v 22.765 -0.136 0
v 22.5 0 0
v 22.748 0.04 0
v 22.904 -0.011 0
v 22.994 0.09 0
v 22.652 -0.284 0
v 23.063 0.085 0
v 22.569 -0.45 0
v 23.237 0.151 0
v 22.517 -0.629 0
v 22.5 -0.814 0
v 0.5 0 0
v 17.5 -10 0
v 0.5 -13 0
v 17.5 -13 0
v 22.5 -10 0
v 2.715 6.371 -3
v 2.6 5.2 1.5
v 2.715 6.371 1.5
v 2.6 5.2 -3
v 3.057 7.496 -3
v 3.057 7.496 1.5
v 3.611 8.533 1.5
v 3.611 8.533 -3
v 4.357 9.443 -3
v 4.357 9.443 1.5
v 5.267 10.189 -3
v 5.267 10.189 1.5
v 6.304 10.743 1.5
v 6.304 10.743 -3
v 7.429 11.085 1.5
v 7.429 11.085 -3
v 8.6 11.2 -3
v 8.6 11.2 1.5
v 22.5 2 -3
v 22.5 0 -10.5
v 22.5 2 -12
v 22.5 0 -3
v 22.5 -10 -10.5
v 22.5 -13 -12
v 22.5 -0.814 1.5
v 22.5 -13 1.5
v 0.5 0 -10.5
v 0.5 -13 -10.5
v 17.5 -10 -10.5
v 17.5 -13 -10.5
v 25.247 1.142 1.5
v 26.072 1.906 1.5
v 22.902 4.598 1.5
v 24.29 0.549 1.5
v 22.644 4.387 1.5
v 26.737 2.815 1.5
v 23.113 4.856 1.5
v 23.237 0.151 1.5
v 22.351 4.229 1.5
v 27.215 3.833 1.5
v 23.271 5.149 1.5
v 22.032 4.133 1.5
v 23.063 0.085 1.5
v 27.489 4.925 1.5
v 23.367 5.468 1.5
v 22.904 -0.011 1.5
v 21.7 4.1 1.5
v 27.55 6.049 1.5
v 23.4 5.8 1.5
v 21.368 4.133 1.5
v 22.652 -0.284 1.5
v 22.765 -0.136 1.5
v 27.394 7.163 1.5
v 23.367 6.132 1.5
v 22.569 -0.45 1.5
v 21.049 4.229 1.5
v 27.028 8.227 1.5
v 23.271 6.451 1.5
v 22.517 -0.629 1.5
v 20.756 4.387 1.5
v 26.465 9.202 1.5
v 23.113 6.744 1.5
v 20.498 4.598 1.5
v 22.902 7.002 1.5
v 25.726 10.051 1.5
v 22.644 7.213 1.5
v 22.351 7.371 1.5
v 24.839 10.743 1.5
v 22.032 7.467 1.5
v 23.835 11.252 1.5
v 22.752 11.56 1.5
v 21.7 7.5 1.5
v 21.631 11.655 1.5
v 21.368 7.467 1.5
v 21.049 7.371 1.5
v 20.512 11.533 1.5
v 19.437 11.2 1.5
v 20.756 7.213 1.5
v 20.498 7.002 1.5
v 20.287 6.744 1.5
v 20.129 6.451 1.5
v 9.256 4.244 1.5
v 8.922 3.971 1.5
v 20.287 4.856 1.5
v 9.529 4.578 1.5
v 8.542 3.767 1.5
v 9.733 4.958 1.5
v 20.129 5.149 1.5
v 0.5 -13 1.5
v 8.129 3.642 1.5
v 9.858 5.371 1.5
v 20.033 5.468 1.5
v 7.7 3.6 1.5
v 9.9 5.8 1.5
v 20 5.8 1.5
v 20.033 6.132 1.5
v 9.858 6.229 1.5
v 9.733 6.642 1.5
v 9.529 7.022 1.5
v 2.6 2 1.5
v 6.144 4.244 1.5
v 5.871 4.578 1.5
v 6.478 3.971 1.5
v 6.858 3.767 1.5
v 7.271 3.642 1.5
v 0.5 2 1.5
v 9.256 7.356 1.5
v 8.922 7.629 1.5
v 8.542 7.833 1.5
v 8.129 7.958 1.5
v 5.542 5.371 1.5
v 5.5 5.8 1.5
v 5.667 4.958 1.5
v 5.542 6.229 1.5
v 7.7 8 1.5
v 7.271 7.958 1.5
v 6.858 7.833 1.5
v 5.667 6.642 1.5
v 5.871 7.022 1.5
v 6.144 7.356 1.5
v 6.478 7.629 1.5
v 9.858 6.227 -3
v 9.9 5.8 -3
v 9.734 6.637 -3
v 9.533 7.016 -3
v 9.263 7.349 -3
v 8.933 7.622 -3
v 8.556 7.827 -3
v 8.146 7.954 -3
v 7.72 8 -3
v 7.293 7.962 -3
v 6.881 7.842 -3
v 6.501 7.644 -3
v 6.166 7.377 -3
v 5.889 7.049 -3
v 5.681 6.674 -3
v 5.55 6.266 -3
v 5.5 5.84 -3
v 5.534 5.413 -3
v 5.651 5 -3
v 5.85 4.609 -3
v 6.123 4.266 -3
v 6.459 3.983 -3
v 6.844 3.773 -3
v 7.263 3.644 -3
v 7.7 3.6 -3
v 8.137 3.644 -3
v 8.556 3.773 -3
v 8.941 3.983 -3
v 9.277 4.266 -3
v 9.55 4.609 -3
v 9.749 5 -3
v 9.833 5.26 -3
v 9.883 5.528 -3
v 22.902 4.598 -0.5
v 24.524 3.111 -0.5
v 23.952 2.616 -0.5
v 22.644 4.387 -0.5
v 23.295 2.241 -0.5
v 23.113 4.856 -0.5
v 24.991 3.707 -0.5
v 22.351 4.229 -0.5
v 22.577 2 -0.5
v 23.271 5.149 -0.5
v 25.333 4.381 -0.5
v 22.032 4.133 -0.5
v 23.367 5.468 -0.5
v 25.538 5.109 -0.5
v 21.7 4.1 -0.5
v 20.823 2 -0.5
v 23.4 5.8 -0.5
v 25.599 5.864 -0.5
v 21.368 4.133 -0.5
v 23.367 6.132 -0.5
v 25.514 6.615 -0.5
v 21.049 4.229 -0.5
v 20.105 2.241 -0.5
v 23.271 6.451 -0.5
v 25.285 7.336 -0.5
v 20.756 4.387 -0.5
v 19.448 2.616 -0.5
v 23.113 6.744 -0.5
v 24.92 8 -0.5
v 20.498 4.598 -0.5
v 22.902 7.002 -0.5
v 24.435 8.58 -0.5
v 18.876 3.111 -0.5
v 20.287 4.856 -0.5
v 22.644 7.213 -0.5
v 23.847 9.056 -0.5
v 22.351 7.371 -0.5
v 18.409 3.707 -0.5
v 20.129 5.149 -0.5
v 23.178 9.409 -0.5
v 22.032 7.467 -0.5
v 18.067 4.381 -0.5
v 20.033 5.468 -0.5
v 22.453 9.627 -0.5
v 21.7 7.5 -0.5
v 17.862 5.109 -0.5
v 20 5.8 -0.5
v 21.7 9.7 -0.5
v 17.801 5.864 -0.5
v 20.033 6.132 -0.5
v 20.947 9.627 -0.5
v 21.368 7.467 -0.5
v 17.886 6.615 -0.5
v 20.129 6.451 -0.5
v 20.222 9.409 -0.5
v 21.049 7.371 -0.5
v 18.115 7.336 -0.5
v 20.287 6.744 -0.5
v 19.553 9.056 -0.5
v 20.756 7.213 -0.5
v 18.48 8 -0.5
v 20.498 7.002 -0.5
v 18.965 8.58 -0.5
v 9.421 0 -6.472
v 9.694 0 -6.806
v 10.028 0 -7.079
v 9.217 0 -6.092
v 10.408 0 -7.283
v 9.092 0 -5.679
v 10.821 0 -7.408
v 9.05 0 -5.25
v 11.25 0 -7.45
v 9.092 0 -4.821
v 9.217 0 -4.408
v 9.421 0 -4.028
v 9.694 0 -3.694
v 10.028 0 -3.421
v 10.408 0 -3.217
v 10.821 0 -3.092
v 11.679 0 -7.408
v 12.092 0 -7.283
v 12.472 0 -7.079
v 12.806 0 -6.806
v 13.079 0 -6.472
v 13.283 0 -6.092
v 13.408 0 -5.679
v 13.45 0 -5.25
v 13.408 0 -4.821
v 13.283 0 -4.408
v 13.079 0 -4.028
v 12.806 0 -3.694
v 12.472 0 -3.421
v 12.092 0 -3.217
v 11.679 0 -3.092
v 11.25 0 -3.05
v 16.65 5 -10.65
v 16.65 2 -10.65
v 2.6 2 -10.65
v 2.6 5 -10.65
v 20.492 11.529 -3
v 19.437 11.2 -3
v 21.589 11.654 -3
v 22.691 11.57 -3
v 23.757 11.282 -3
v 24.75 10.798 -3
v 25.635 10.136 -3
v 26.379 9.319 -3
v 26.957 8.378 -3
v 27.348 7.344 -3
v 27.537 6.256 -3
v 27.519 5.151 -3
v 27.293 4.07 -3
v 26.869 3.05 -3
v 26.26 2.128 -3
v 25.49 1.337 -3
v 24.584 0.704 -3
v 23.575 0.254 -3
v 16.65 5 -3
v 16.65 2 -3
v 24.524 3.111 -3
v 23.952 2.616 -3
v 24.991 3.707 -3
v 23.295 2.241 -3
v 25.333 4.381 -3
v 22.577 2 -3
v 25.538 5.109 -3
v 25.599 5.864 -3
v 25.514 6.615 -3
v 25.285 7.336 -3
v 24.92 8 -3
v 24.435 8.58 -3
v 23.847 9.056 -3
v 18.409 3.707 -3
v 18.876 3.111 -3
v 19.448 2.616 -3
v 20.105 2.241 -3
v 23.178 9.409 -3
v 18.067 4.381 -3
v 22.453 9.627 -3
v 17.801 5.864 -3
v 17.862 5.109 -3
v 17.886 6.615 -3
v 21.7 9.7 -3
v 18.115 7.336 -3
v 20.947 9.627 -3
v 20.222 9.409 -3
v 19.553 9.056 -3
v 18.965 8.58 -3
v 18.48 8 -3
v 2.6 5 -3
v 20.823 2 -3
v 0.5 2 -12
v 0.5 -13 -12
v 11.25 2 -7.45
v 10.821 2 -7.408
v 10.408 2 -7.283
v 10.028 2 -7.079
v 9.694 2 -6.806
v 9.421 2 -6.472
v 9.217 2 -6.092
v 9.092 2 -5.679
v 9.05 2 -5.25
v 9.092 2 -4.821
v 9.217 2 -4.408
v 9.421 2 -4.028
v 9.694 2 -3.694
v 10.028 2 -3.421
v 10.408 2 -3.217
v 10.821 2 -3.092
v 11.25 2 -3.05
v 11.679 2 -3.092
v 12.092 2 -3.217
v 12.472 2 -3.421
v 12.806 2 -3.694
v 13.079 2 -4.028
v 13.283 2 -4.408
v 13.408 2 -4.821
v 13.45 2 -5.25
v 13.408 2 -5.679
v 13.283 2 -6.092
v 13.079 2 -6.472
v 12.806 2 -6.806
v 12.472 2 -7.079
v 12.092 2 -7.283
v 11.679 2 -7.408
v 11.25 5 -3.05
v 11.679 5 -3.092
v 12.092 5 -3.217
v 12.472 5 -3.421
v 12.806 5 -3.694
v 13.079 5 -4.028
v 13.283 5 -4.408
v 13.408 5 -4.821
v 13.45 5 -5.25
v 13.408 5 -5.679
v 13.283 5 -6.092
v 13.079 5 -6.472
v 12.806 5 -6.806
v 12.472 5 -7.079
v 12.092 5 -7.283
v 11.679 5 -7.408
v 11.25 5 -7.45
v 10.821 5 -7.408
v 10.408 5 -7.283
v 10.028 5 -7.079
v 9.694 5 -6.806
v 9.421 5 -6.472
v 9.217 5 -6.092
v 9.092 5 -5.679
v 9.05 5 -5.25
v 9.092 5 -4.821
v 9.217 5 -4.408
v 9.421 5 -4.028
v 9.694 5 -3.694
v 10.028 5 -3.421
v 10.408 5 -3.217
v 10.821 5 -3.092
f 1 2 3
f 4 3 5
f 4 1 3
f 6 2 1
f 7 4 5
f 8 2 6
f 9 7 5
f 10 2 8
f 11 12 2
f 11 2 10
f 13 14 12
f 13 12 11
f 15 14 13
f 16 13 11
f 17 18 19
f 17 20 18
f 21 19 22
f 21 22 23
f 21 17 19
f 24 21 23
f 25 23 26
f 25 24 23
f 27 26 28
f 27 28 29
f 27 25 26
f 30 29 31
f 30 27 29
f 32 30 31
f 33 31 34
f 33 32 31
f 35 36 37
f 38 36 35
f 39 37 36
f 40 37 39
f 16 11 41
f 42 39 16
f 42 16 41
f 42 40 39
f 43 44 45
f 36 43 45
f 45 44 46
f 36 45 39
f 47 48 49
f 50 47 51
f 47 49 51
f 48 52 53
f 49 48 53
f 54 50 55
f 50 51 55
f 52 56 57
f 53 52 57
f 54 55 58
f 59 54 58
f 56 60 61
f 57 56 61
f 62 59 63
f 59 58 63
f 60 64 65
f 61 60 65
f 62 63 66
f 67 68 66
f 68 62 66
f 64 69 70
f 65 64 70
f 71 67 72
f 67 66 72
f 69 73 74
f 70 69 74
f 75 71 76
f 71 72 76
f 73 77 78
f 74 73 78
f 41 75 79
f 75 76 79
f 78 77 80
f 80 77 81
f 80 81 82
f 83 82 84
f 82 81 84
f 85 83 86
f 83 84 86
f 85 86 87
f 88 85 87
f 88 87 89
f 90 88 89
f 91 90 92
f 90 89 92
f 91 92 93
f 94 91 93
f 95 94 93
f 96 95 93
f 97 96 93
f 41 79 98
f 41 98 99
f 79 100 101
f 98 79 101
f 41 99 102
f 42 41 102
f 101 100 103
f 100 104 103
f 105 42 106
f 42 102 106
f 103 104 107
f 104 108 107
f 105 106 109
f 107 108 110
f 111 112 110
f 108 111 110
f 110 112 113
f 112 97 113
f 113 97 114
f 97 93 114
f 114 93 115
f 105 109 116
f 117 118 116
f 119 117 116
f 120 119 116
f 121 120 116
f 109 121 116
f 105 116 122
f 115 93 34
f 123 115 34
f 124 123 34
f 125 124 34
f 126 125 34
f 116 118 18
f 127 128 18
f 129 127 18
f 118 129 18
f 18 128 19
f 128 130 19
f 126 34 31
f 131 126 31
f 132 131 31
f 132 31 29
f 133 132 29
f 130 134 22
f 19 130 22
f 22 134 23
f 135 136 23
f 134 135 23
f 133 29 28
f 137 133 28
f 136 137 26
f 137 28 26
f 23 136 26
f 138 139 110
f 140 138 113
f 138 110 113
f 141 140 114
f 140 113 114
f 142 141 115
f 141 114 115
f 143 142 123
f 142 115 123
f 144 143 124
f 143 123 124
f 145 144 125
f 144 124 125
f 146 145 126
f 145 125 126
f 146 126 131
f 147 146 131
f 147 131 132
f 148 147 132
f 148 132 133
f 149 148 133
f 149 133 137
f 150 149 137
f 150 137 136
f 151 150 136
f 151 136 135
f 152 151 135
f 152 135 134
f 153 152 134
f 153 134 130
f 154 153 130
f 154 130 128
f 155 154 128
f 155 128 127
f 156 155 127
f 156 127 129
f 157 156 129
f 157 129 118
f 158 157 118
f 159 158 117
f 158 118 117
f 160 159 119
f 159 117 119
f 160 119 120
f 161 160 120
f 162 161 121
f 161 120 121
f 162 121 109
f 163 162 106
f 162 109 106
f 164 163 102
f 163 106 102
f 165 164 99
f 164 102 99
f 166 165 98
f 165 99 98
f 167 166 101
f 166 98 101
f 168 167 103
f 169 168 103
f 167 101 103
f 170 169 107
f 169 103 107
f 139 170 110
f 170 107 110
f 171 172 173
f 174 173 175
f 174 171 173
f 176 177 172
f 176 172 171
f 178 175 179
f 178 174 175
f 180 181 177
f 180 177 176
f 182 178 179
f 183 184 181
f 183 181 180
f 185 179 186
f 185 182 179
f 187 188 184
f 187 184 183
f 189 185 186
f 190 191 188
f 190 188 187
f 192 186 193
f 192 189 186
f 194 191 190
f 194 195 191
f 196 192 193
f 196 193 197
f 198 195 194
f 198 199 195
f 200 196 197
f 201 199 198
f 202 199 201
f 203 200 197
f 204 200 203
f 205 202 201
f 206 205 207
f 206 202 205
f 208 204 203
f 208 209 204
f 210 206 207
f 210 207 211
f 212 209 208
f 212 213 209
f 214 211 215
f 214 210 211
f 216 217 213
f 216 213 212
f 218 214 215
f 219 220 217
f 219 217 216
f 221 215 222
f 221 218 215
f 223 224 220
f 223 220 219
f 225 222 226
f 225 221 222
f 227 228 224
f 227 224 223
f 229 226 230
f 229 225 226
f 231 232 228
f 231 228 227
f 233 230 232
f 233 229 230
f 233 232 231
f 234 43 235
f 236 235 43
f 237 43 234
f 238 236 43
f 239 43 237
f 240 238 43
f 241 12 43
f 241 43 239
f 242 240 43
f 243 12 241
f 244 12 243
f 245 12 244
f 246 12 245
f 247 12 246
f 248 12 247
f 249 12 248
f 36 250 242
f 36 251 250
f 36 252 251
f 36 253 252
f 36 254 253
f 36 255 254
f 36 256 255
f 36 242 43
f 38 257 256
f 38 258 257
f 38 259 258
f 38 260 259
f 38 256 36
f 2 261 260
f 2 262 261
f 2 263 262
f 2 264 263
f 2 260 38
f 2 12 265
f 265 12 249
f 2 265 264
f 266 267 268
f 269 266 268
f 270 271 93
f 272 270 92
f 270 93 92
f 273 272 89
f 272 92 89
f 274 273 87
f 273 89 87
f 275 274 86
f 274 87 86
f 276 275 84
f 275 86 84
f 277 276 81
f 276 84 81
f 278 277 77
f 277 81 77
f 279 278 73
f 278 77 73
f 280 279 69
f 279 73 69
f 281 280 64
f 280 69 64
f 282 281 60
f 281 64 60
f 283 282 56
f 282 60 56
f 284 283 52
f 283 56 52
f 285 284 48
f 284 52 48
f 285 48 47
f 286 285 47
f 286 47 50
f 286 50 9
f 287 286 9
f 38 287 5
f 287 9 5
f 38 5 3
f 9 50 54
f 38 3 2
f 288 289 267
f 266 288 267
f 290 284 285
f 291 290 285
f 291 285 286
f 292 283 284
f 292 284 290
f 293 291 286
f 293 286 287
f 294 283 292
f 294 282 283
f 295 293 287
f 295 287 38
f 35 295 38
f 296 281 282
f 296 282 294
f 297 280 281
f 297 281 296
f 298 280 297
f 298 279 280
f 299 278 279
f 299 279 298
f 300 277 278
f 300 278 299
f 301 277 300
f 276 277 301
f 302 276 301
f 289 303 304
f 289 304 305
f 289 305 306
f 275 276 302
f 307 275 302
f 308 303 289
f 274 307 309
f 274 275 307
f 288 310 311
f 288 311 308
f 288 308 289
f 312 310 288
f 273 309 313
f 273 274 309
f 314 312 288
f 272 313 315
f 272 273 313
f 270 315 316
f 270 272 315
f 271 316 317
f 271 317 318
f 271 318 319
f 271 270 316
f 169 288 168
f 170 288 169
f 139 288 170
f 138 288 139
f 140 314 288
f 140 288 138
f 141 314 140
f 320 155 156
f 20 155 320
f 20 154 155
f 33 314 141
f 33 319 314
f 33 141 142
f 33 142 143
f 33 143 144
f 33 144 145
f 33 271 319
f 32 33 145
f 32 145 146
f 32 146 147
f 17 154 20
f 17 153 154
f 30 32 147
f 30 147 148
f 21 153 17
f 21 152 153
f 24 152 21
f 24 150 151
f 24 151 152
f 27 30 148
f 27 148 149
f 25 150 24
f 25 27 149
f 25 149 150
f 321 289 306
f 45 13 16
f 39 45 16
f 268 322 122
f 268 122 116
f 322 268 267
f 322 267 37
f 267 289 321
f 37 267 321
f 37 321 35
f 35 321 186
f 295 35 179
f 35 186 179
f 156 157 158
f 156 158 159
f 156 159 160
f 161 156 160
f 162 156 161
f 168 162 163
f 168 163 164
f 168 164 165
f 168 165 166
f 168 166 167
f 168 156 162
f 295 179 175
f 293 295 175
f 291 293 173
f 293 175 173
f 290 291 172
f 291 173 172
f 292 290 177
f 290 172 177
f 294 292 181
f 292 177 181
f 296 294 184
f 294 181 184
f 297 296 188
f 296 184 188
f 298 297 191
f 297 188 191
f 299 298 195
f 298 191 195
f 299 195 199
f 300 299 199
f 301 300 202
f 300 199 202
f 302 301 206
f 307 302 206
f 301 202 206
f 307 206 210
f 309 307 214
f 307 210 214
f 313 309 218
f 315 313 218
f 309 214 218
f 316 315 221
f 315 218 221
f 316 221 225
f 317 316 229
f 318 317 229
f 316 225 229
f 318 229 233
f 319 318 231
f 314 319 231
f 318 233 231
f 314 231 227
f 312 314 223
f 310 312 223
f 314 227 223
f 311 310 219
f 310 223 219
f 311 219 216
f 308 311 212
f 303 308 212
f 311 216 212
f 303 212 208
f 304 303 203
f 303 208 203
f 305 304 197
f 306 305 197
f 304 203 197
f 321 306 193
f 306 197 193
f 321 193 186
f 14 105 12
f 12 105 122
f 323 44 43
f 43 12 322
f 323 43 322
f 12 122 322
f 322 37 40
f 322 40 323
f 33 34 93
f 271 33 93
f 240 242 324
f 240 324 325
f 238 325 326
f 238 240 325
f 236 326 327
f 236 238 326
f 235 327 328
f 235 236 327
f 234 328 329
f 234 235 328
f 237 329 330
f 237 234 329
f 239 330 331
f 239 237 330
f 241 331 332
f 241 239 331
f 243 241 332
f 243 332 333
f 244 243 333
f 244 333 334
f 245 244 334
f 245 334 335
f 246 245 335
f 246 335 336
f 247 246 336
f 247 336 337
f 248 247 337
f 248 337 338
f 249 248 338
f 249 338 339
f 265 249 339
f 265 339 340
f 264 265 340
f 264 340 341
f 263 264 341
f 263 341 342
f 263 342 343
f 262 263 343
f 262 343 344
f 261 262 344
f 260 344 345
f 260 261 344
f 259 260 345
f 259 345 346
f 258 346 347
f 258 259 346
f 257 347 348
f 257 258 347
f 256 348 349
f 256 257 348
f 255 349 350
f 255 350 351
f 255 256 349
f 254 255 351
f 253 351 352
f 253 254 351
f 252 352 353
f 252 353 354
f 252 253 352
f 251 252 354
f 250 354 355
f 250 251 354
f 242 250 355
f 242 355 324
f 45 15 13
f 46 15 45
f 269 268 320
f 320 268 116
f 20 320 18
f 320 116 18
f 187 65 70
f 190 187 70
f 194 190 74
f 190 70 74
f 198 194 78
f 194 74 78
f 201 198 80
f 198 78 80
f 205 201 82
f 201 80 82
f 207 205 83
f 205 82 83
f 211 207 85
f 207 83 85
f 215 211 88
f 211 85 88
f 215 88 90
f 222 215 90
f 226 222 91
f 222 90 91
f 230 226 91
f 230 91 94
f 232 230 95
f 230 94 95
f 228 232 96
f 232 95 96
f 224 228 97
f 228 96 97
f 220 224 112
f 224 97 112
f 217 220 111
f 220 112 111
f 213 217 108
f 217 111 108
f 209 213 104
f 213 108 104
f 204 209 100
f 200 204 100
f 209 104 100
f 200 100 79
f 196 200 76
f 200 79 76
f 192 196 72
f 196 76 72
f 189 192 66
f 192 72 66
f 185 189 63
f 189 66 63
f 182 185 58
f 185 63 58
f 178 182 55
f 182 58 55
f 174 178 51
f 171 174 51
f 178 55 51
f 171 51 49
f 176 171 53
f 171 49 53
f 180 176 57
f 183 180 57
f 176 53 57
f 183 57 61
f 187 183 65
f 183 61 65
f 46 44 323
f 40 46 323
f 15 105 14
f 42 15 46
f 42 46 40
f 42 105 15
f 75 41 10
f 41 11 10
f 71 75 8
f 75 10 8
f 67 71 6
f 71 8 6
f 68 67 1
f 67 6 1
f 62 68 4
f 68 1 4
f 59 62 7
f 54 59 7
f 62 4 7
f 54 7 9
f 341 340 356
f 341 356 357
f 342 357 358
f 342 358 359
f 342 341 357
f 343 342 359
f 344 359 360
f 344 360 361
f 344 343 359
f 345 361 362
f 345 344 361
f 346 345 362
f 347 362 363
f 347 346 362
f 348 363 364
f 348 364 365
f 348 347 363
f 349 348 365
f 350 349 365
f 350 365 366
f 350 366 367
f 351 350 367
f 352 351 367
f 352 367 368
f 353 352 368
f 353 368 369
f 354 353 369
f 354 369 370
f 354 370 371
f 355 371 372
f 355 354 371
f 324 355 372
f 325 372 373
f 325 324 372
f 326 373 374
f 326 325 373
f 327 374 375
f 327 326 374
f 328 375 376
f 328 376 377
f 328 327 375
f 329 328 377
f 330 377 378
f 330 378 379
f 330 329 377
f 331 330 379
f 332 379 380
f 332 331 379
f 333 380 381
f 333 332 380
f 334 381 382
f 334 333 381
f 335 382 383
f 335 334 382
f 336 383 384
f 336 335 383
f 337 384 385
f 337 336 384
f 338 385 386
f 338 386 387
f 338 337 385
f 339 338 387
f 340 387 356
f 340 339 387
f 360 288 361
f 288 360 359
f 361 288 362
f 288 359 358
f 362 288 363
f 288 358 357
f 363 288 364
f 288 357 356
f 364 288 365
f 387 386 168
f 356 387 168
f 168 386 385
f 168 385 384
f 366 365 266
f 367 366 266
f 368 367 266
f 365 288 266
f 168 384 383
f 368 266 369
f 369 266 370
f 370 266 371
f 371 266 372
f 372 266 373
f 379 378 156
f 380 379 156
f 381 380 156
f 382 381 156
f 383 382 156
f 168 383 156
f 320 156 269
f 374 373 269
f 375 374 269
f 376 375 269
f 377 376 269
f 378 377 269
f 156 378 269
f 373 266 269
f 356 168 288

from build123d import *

# Parameters (mm, degrees)
SKETCH1_W            = 21.5
SKETCH1_H            = 10.5
BOSS_EXTRUDE1_DEPTH  = 2
BOSS_EXTRUDE3_DEPTH  = 15
BOSS_EXTRUDE7_REACH  = 30.623
SKETCH8_W            = 1
SKETCH8_H            = 2
BOSS_EXTRUDE5_DEPTH  = 3
SKETCH6_R            = 1.7
BOSS_EXTRUDE6_DEPTH  = 2
BOSS_EXTRUDE8_DEPTH  = 2.5
FILLET1_R            = 1
SKETCH12_W           = 1
SKETCH12_H           = 10.5
CUT_EXTRUDE1_DEPTH   = 13
CUT_EXTRUDE2_DEPTH   = 1.5
SKETCH15_R           = 2.2
BOSS_EXTRUDE9_DEPTH  = 3
SKETCH16_R           = 0.670189152
BOSS_EXTRUDE10_DEPTH = 4.5
SKETCH17_R           = 2.2
CUT_EXTRUDE3_DEPTH   = 4.5
CUT_EXTRUDE4_START   = -4.5
SKETCH18_R           = 2.2
CUT_EXTRUDE4_DEPTH   = 4.5
FILLET2_R            = 6


with BuildPart() as part:
    # Sketch1 → Boss-Extrude1 (new body)
    with BuildSketch(Plane(origin=(0, 0, 0), x_dir=(1, 0, 0), z_dir=(0, 1, 0))):
        with Locations((10.75, 5.25)):
            Rectangle(SKETCH1_W, SKETCH1_H)
    extrude(amount=BOSS_EXTRUDE1_DEPTH)

    # Sketch3 → Boss-Extrude3 (add)
    with BuildSketch(Plane(origin=(0, 2, 0), x_dir=(1, 0, 0), z_dir=(0, 1, 0))):
        Polygon((0, 10.5), (22.5, 10.5), (22.5, 12), (-1, 12), (-1, -1.5), (22.5, -1.5), (22.5, 0), (0, 0), align=None)
    extrude(amount=-BOSS_EXTRUDE3_DEPTH)

    # Sketch8 → Boss-Extrude7 (add, up to next)
    with BuildSketch(Plane(origin=(0, 0, 0), x_dir=(-1, 0, 0), z_dir=(0, 0, -1)), mode=Mode.PRIVATE) as boss_extrude7_sk1:
        with Locations((-22, 1)):
            Rectangle(SKETCH8_W, SKETCH8_H)
    boss_extrude7_tool1 = extrude(boss_extrude7_sk1.sketch, amount=BOSS_EXTRUDE7_REACH, mode=Mode.PRIVATE) - part.part
    add(boss_extrude7_tool1.solids().sort_by_distance((22, 1, 0))[0])

    # Sketch5 → Boss-Extrude5 (add)
    with BuildSketch(Plane.XZ.offset(13)):
        Polygon((17.5, 0), (17.5, -10.5), (22.5, -10.5), (22.5, 1.5), (17.5, 1.5), align=None)
    extrude(amount=-BOSS_EXTRUDE5_DEPTH)



with BuildPart() as body_2:
    # Sketch6 → Boss-Extrude6 (new body)
    with BuildSketch(Plane.XY.offset(1.5)):
        with BuildLine():
            Line((22.5, 0), (22.5, 2))
            Line((22.5, 2), (17.24578851, 2))
            ThreePointArc((17.24578851, 2), (23.78286231, 11.271899542), (22.5, 0))
        make_face()
        with Locations((21.7, 5.8)):
            Circle(SKETCH6_R, mode=Mode.SUBTRACT)
    extrude(amount=-BOSS_EXTRUDE6_DEPTH)


with BuildPart() as part_1:
    add(part.part)

    add(body_2.part)  # Boss-Extrude8 merges body 2
    # Sketch9 → Boss-Extrude8 (add)
    with BuildSketch(Plane(origin=(0, 0, -0.5), x_dir=(-1, 0, 0), z_dir=(0, 0, -1))):
        with BuildLine():
            Line((-22.5, 2), (-22.577496439, 2))
            ThreePointArc((-22.577496439, 2), (-21.7, 9.7), (-20.822503561, 2))
            Line((-20.822503561, 2), (-17.24578851, 2))
            ThreePointArc((-17.24578851, 2), (-23.78286231, 11.271899542), (-22.5, 0))
            Line((-22.5, 0), (-22.5, 2))
        make_face()
    extrude(amount=BOSS_EXTRUDE8_DEPTH)

    # Fillet1
    fillet1_edges = [part_1.edges().sort_by_distance(p)[0] for p in [
        (22.5, 0, 0.75),
        (17.24578851, 2, -0.75),
    ]]
    fillet(fillet1_edges, radius=FILLET1_R)

    # Sketch12 → Cut-Extrude1 (cut)
    with BuildSketch(Plane.XZ.offset(13)):
        with Locations((-0.5, -5.25)):
            Rectangle(SKETCH12_W, SKETCH12_H)
    extrude(amount=-CUT_EXTRUDE1_DEPTH, mode=Mode.SUBTRACT)

    # Sketch13 → Cut-Extrude2 (cut)
    with BuildSketch(Plane.ZY.offset(1)):
        Polygon((-12, -13), (-12, 2), (1.5, 2), (1.5, -13), (0, -13), (0, 0), (-10.5, 0), (-10.5, -13), align=None)
    extrude(amount=-CUT_EXTRUDE2_DEPTH, mode=Mode.SUBTRACT)

    # Sketch15 → Boss-Extrude9 (add)
    with BuildSketch(Plane(origin=(0, 2, 0), x_dir=(1, 0, 0), z_dir=(0, 1, 0))):
        Polygon((5.85, 10.65), (16.65, 10.65), (16.65, -0.15), (16.65, -1.5), (2.6, -1.5), (2.6, 10.65), align=None)
        with Locations(Location((11.25, 5.25, 0), (0, 0, 270))):
            Circle(SKETCH15_R, mode=Mode.SUBTRACT)
    extrude(amount=BOSS_EXTRUDE9_DEPTH)

    # Sketch16 → Boss-Extrude10 (add)
    with BuildSketch(Plane.XY.offset(1.5)):
        with BuildLine():
            Line((2.6, 5), (2.6, 11.2))
            Line((2.6, 11.2), (19.4372583, 11.2))
            ThreePointArc((19.4372583, 11.2), (16.614535328, 8.701387439), (15.9, 5))
            Line((15.9, 5), (2.6, 5))
        make_face()
        with Locations((7.7, 5.8)):
            Circle(SKETCH16_R, mode=Mode.SUBTRACT)
    extrude(amount=-BOSS_EXTRUDE10_DEPTH)

    # Sketch17 → Cut-Extrude3 (cut)
    with BuildSketch(Plane.XY.offset(1.5)):
        with Locations((7.7, 5.8)):
            Circle(SKETCH17_R)
    extrude(amount=-CUT_EXTRUDE3_DEPTH, mode=Mode.SUBTRACT)

    # Sketch18 → Cut-Extrude4 (cut)
    with BuildSketch(Plane(origin=(0, 2, 0), x_dir=(1, 0, 0), z_dir=(0, 1, 0)).offset(CUT_EXTRUDE4_START)):
        with Locations(Location((11.25, 5.25, 0), (0, 0, 90))):
            Circle(SKETCH18_R)
    extrude(amount=CUT_EXTRUDE4_DEPTH, mode=Mode.SUBTRACT)

    # Fillet2
    fillet2_edges = [part_1.edges().sort_by_distance(p)[0] for p in [
        (2.6, 11.2, -0.75),
    ]]
    fillet(fillet2_edges, radius=FILLET2_R)


solid = part_1.part
